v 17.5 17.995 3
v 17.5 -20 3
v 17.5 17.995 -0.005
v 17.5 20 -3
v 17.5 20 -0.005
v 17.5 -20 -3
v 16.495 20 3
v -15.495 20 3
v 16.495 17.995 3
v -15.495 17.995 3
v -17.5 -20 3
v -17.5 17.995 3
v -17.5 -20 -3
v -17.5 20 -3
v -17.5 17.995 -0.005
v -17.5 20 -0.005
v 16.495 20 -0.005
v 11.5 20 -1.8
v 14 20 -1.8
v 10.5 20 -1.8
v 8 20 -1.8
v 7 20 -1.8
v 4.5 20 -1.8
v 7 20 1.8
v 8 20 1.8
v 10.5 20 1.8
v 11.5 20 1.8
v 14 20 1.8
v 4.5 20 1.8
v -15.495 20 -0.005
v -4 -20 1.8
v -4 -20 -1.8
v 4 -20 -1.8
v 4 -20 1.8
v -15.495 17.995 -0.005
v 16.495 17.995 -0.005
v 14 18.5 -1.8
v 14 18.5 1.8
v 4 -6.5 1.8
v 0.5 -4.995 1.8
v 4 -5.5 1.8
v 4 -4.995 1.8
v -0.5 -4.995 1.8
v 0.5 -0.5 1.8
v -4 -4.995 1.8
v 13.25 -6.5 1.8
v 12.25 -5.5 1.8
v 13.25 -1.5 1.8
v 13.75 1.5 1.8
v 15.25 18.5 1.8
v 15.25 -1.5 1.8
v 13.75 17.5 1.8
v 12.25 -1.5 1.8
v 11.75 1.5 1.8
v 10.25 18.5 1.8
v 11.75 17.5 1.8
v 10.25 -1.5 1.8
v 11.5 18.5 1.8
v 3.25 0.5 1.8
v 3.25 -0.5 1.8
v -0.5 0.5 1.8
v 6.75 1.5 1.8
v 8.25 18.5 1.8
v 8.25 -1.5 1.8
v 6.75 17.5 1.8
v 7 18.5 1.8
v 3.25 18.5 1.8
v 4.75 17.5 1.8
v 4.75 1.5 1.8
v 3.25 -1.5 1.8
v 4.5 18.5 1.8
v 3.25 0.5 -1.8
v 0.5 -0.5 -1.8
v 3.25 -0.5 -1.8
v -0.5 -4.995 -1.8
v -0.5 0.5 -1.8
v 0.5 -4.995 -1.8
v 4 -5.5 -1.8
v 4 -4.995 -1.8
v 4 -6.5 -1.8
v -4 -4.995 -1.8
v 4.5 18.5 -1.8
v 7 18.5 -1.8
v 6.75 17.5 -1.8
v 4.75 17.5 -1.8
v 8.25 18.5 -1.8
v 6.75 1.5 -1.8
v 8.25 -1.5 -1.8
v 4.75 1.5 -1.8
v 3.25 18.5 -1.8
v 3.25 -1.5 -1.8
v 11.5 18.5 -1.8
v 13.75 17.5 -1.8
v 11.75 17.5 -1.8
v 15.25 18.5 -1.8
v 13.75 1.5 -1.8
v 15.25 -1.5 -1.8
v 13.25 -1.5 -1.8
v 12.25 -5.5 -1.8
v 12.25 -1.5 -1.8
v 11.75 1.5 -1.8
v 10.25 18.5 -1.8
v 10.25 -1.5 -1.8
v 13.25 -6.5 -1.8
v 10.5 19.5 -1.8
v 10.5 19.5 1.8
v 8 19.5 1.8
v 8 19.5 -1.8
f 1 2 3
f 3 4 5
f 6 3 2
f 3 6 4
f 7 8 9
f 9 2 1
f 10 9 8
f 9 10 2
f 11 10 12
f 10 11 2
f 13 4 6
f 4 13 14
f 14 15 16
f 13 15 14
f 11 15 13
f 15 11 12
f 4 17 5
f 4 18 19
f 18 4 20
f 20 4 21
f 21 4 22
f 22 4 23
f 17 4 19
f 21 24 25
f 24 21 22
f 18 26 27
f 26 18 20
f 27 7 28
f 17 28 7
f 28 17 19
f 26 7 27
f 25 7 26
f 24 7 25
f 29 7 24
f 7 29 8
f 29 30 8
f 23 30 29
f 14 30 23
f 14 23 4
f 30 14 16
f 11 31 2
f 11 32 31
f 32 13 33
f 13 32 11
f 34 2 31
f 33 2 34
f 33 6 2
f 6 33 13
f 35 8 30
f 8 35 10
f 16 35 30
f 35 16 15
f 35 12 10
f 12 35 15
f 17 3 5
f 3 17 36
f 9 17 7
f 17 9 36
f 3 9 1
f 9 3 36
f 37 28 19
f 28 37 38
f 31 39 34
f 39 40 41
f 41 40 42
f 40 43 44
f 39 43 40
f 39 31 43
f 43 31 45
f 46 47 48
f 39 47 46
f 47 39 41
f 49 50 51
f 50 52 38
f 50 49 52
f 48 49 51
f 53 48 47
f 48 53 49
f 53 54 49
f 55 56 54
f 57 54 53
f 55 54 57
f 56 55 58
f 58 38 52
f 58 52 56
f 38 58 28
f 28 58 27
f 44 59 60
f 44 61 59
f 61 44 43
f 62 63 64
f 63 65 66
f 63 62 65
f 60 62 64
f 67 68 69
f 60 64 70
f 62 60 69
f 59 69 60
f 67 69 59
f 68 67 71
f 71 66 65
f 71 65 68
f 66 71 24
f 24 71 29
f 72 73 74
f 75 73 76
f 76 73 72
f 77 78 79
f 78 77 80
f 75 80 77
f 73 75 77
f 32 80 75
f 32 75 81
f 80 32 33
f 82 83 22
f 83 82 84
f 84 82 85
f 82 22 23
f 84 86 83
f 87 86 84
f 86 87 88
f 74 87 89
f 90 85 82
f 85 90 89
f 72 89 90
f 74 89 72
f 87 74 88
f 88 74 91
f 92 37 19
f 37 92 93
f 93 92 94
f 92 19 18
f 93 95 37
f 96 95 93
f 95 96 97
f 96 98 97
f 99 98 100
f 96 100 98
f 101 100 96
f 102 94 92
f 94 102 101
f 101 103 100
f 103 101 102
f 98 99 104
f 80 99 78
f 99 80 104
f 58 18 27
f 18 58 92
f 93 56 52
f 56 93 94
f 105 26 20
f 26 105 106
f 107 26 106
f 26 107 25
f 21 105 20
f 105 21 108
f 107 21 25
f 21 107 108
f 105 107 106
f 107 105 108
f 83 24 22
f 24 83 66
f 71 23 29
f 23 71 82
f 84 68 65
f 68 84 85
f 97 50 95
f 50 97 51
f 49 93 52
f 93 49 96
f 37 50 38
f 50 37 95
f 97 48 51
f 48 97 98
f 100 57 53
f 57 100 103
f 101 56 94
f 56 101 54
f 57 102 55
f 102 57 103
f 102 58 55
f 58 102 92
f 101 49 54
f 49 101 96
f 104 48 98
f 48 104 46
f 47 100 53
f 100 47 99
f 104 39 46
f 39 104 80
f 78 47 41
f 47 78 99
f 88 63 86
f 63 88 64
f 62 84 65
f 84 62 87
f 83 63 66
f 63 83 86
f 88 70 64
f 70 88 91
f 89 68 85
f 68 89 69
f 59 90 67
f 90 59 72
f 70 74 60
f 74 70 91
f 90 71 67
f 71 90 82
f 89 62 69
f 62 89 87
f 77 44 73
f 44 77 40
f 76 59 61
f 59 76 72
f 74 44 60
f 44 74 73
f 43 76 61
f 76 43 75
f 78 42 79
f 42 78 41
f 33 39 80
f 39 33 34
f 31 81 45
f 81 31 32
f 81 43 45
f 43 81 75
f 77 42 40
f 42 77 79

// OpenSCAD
/*
 * Canon NB-4L battery eliminator design
 *
 * Based on http://www.thingiverse.com/thing:17437
 *
 * (c) krist10an 2012
 *
 */

hh = 6;
ll = 35;
ww = 40;

innerh = 3.6;

// overlap
oo = 0.01;

wall = (hh-innerh)/2;
echo ("Top and bottom wall size=",wall);

 difference() {
	cube(size=[ll,ww,hh],center=true);
	//Corners
	translate(v=[-ll/2+1,ww/2-1,1.5]) cube(size=[2+oo,2+oo,3+oo],center=true);
	translate(v=[ll/2-0.5,ww/2-1,1.5]) cube(size=[1+oo,2+oo,3+oo],center=true);

	//+ and GND pins
	//- Pin
	translate(v=[ll/2-2.5/2-3.5,ww/2-3/2+0.5,0]) #cube(size=[2.5,3,innerh],center=true);
	//Data/Not used
	translate(v=[ll/2-2.5/2-7,ww/2-0.5/2,0]) #cube(size=[2.5,0.5,innerh],center=true);
	//+ Pin
	translate(v=[ll/2-2.5/2-10.5,ww/2-3/2+0.5,0]) #cube(size=[2.5,3,innerh],center=true);

	//Room for desoldering wick
	//GND Part
	translate(v=[ll/2-1/2-3/2-1,ww/2-20/2-1.5,0]) cube(size=[1.5,20,innerh],center=true);
	translate(v=[ll/2-1/2-3/2-1-3.5,ww/2-20/2-1.5,0]) cube(size=[1.5,20,innerh],center=true);

	translate(v=[ll/2-1/2-3/2-2.5,0,0]) cube(size=[3.5,3,innerh],center=true);
	translate(v=[ll/2-1/2-3/2-2.75,-4,0]) cube(size=[1,5,innerh],center=true);
	translate(v=[7.75,-6,0]) cube(size=[11,1,innerh],center=true);
	//translate(v=[2,-19,0]) cube(size=[1,5,innerh],center=true);

	//+ Part
	translate(v=[ll/2-1/2-3/2-1-7,ww/2-20/2-1.5,0]) cube(size=[1.5,20,innerh],center=true);
	translate(v=[ll/2-1/2-3/2-1-3.5-7,ww/2-20/2-1.5,0]) cube(size=[1.5,20,innerh],center=true);
	translate(v=[ll/2-1/2-3/2-10,0,0]) cube(size=[3.5,3,innerh],center=true);
	translate(v=[3,0,0]) cube(size=[5,1,innerh],center=true);
	translate(v=[0,-2.5,0]) cube(size=[1,6,innerh],center=true);

	//Room for female servo connector
	translate(v=[0,-12.5,0]) cube(size=[8,15+oo,innerh],center=true);
}
